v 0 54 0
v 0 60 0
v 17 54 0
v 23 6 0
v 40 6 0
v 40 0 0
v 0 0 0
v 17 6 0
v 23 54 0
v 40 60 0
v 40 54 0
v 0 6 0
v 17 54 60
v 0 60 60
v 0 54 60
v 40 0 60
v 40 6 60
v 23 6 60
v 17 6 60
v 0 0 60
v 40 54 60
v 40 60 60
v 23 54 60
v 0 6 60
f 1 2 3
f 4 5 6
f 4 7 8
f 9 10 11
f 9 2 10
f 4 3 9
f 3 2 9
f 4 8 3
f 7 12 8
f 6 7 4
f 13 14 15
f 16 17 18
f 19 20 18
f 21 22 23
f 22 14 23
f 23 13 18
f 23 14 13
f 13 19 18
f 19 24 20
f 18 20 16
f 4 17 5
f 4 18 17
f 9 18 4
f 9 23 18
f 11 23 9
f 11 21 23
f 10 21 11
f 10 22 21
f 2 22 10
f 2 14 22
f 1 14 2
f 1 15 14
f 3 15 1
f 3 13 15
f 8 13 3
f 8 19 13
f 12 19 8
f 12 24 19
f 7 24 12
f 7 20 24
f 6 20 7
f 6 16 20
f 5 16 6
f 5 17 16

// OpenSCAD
$fn = 32;

// ----------------------------------------------------------------------
// Structural section: ibeam 40 x 60 mm
// ----------------------------------------------------------------------

// --- parameters (mm) ---
sec_w = 40;               // section width, X
sec_h = 60;               // section height, Y
flange_t = 6;             // flange thickness
web_t = 6;                // web thickness
plate_t = 60;             // cut length, Z (extrusion height)
fit_tol = 0.05;           // declared fit tolerance (prompt contract)
free_tol = 0.3;           // declared free tolerance (prompt contract)

profile = [[0, 0], [40, 0], [40, 6], [23, 6], [23, 54], [40, 54], [40, 60], [0, 60], [0, 54], [17, 54], [17, 6], [0, 6]];  // primary outline, 12 points, counter clockwise

// --- the one profile operation ---
linear_extrude(height = plate_t) polygon(points = profile);
